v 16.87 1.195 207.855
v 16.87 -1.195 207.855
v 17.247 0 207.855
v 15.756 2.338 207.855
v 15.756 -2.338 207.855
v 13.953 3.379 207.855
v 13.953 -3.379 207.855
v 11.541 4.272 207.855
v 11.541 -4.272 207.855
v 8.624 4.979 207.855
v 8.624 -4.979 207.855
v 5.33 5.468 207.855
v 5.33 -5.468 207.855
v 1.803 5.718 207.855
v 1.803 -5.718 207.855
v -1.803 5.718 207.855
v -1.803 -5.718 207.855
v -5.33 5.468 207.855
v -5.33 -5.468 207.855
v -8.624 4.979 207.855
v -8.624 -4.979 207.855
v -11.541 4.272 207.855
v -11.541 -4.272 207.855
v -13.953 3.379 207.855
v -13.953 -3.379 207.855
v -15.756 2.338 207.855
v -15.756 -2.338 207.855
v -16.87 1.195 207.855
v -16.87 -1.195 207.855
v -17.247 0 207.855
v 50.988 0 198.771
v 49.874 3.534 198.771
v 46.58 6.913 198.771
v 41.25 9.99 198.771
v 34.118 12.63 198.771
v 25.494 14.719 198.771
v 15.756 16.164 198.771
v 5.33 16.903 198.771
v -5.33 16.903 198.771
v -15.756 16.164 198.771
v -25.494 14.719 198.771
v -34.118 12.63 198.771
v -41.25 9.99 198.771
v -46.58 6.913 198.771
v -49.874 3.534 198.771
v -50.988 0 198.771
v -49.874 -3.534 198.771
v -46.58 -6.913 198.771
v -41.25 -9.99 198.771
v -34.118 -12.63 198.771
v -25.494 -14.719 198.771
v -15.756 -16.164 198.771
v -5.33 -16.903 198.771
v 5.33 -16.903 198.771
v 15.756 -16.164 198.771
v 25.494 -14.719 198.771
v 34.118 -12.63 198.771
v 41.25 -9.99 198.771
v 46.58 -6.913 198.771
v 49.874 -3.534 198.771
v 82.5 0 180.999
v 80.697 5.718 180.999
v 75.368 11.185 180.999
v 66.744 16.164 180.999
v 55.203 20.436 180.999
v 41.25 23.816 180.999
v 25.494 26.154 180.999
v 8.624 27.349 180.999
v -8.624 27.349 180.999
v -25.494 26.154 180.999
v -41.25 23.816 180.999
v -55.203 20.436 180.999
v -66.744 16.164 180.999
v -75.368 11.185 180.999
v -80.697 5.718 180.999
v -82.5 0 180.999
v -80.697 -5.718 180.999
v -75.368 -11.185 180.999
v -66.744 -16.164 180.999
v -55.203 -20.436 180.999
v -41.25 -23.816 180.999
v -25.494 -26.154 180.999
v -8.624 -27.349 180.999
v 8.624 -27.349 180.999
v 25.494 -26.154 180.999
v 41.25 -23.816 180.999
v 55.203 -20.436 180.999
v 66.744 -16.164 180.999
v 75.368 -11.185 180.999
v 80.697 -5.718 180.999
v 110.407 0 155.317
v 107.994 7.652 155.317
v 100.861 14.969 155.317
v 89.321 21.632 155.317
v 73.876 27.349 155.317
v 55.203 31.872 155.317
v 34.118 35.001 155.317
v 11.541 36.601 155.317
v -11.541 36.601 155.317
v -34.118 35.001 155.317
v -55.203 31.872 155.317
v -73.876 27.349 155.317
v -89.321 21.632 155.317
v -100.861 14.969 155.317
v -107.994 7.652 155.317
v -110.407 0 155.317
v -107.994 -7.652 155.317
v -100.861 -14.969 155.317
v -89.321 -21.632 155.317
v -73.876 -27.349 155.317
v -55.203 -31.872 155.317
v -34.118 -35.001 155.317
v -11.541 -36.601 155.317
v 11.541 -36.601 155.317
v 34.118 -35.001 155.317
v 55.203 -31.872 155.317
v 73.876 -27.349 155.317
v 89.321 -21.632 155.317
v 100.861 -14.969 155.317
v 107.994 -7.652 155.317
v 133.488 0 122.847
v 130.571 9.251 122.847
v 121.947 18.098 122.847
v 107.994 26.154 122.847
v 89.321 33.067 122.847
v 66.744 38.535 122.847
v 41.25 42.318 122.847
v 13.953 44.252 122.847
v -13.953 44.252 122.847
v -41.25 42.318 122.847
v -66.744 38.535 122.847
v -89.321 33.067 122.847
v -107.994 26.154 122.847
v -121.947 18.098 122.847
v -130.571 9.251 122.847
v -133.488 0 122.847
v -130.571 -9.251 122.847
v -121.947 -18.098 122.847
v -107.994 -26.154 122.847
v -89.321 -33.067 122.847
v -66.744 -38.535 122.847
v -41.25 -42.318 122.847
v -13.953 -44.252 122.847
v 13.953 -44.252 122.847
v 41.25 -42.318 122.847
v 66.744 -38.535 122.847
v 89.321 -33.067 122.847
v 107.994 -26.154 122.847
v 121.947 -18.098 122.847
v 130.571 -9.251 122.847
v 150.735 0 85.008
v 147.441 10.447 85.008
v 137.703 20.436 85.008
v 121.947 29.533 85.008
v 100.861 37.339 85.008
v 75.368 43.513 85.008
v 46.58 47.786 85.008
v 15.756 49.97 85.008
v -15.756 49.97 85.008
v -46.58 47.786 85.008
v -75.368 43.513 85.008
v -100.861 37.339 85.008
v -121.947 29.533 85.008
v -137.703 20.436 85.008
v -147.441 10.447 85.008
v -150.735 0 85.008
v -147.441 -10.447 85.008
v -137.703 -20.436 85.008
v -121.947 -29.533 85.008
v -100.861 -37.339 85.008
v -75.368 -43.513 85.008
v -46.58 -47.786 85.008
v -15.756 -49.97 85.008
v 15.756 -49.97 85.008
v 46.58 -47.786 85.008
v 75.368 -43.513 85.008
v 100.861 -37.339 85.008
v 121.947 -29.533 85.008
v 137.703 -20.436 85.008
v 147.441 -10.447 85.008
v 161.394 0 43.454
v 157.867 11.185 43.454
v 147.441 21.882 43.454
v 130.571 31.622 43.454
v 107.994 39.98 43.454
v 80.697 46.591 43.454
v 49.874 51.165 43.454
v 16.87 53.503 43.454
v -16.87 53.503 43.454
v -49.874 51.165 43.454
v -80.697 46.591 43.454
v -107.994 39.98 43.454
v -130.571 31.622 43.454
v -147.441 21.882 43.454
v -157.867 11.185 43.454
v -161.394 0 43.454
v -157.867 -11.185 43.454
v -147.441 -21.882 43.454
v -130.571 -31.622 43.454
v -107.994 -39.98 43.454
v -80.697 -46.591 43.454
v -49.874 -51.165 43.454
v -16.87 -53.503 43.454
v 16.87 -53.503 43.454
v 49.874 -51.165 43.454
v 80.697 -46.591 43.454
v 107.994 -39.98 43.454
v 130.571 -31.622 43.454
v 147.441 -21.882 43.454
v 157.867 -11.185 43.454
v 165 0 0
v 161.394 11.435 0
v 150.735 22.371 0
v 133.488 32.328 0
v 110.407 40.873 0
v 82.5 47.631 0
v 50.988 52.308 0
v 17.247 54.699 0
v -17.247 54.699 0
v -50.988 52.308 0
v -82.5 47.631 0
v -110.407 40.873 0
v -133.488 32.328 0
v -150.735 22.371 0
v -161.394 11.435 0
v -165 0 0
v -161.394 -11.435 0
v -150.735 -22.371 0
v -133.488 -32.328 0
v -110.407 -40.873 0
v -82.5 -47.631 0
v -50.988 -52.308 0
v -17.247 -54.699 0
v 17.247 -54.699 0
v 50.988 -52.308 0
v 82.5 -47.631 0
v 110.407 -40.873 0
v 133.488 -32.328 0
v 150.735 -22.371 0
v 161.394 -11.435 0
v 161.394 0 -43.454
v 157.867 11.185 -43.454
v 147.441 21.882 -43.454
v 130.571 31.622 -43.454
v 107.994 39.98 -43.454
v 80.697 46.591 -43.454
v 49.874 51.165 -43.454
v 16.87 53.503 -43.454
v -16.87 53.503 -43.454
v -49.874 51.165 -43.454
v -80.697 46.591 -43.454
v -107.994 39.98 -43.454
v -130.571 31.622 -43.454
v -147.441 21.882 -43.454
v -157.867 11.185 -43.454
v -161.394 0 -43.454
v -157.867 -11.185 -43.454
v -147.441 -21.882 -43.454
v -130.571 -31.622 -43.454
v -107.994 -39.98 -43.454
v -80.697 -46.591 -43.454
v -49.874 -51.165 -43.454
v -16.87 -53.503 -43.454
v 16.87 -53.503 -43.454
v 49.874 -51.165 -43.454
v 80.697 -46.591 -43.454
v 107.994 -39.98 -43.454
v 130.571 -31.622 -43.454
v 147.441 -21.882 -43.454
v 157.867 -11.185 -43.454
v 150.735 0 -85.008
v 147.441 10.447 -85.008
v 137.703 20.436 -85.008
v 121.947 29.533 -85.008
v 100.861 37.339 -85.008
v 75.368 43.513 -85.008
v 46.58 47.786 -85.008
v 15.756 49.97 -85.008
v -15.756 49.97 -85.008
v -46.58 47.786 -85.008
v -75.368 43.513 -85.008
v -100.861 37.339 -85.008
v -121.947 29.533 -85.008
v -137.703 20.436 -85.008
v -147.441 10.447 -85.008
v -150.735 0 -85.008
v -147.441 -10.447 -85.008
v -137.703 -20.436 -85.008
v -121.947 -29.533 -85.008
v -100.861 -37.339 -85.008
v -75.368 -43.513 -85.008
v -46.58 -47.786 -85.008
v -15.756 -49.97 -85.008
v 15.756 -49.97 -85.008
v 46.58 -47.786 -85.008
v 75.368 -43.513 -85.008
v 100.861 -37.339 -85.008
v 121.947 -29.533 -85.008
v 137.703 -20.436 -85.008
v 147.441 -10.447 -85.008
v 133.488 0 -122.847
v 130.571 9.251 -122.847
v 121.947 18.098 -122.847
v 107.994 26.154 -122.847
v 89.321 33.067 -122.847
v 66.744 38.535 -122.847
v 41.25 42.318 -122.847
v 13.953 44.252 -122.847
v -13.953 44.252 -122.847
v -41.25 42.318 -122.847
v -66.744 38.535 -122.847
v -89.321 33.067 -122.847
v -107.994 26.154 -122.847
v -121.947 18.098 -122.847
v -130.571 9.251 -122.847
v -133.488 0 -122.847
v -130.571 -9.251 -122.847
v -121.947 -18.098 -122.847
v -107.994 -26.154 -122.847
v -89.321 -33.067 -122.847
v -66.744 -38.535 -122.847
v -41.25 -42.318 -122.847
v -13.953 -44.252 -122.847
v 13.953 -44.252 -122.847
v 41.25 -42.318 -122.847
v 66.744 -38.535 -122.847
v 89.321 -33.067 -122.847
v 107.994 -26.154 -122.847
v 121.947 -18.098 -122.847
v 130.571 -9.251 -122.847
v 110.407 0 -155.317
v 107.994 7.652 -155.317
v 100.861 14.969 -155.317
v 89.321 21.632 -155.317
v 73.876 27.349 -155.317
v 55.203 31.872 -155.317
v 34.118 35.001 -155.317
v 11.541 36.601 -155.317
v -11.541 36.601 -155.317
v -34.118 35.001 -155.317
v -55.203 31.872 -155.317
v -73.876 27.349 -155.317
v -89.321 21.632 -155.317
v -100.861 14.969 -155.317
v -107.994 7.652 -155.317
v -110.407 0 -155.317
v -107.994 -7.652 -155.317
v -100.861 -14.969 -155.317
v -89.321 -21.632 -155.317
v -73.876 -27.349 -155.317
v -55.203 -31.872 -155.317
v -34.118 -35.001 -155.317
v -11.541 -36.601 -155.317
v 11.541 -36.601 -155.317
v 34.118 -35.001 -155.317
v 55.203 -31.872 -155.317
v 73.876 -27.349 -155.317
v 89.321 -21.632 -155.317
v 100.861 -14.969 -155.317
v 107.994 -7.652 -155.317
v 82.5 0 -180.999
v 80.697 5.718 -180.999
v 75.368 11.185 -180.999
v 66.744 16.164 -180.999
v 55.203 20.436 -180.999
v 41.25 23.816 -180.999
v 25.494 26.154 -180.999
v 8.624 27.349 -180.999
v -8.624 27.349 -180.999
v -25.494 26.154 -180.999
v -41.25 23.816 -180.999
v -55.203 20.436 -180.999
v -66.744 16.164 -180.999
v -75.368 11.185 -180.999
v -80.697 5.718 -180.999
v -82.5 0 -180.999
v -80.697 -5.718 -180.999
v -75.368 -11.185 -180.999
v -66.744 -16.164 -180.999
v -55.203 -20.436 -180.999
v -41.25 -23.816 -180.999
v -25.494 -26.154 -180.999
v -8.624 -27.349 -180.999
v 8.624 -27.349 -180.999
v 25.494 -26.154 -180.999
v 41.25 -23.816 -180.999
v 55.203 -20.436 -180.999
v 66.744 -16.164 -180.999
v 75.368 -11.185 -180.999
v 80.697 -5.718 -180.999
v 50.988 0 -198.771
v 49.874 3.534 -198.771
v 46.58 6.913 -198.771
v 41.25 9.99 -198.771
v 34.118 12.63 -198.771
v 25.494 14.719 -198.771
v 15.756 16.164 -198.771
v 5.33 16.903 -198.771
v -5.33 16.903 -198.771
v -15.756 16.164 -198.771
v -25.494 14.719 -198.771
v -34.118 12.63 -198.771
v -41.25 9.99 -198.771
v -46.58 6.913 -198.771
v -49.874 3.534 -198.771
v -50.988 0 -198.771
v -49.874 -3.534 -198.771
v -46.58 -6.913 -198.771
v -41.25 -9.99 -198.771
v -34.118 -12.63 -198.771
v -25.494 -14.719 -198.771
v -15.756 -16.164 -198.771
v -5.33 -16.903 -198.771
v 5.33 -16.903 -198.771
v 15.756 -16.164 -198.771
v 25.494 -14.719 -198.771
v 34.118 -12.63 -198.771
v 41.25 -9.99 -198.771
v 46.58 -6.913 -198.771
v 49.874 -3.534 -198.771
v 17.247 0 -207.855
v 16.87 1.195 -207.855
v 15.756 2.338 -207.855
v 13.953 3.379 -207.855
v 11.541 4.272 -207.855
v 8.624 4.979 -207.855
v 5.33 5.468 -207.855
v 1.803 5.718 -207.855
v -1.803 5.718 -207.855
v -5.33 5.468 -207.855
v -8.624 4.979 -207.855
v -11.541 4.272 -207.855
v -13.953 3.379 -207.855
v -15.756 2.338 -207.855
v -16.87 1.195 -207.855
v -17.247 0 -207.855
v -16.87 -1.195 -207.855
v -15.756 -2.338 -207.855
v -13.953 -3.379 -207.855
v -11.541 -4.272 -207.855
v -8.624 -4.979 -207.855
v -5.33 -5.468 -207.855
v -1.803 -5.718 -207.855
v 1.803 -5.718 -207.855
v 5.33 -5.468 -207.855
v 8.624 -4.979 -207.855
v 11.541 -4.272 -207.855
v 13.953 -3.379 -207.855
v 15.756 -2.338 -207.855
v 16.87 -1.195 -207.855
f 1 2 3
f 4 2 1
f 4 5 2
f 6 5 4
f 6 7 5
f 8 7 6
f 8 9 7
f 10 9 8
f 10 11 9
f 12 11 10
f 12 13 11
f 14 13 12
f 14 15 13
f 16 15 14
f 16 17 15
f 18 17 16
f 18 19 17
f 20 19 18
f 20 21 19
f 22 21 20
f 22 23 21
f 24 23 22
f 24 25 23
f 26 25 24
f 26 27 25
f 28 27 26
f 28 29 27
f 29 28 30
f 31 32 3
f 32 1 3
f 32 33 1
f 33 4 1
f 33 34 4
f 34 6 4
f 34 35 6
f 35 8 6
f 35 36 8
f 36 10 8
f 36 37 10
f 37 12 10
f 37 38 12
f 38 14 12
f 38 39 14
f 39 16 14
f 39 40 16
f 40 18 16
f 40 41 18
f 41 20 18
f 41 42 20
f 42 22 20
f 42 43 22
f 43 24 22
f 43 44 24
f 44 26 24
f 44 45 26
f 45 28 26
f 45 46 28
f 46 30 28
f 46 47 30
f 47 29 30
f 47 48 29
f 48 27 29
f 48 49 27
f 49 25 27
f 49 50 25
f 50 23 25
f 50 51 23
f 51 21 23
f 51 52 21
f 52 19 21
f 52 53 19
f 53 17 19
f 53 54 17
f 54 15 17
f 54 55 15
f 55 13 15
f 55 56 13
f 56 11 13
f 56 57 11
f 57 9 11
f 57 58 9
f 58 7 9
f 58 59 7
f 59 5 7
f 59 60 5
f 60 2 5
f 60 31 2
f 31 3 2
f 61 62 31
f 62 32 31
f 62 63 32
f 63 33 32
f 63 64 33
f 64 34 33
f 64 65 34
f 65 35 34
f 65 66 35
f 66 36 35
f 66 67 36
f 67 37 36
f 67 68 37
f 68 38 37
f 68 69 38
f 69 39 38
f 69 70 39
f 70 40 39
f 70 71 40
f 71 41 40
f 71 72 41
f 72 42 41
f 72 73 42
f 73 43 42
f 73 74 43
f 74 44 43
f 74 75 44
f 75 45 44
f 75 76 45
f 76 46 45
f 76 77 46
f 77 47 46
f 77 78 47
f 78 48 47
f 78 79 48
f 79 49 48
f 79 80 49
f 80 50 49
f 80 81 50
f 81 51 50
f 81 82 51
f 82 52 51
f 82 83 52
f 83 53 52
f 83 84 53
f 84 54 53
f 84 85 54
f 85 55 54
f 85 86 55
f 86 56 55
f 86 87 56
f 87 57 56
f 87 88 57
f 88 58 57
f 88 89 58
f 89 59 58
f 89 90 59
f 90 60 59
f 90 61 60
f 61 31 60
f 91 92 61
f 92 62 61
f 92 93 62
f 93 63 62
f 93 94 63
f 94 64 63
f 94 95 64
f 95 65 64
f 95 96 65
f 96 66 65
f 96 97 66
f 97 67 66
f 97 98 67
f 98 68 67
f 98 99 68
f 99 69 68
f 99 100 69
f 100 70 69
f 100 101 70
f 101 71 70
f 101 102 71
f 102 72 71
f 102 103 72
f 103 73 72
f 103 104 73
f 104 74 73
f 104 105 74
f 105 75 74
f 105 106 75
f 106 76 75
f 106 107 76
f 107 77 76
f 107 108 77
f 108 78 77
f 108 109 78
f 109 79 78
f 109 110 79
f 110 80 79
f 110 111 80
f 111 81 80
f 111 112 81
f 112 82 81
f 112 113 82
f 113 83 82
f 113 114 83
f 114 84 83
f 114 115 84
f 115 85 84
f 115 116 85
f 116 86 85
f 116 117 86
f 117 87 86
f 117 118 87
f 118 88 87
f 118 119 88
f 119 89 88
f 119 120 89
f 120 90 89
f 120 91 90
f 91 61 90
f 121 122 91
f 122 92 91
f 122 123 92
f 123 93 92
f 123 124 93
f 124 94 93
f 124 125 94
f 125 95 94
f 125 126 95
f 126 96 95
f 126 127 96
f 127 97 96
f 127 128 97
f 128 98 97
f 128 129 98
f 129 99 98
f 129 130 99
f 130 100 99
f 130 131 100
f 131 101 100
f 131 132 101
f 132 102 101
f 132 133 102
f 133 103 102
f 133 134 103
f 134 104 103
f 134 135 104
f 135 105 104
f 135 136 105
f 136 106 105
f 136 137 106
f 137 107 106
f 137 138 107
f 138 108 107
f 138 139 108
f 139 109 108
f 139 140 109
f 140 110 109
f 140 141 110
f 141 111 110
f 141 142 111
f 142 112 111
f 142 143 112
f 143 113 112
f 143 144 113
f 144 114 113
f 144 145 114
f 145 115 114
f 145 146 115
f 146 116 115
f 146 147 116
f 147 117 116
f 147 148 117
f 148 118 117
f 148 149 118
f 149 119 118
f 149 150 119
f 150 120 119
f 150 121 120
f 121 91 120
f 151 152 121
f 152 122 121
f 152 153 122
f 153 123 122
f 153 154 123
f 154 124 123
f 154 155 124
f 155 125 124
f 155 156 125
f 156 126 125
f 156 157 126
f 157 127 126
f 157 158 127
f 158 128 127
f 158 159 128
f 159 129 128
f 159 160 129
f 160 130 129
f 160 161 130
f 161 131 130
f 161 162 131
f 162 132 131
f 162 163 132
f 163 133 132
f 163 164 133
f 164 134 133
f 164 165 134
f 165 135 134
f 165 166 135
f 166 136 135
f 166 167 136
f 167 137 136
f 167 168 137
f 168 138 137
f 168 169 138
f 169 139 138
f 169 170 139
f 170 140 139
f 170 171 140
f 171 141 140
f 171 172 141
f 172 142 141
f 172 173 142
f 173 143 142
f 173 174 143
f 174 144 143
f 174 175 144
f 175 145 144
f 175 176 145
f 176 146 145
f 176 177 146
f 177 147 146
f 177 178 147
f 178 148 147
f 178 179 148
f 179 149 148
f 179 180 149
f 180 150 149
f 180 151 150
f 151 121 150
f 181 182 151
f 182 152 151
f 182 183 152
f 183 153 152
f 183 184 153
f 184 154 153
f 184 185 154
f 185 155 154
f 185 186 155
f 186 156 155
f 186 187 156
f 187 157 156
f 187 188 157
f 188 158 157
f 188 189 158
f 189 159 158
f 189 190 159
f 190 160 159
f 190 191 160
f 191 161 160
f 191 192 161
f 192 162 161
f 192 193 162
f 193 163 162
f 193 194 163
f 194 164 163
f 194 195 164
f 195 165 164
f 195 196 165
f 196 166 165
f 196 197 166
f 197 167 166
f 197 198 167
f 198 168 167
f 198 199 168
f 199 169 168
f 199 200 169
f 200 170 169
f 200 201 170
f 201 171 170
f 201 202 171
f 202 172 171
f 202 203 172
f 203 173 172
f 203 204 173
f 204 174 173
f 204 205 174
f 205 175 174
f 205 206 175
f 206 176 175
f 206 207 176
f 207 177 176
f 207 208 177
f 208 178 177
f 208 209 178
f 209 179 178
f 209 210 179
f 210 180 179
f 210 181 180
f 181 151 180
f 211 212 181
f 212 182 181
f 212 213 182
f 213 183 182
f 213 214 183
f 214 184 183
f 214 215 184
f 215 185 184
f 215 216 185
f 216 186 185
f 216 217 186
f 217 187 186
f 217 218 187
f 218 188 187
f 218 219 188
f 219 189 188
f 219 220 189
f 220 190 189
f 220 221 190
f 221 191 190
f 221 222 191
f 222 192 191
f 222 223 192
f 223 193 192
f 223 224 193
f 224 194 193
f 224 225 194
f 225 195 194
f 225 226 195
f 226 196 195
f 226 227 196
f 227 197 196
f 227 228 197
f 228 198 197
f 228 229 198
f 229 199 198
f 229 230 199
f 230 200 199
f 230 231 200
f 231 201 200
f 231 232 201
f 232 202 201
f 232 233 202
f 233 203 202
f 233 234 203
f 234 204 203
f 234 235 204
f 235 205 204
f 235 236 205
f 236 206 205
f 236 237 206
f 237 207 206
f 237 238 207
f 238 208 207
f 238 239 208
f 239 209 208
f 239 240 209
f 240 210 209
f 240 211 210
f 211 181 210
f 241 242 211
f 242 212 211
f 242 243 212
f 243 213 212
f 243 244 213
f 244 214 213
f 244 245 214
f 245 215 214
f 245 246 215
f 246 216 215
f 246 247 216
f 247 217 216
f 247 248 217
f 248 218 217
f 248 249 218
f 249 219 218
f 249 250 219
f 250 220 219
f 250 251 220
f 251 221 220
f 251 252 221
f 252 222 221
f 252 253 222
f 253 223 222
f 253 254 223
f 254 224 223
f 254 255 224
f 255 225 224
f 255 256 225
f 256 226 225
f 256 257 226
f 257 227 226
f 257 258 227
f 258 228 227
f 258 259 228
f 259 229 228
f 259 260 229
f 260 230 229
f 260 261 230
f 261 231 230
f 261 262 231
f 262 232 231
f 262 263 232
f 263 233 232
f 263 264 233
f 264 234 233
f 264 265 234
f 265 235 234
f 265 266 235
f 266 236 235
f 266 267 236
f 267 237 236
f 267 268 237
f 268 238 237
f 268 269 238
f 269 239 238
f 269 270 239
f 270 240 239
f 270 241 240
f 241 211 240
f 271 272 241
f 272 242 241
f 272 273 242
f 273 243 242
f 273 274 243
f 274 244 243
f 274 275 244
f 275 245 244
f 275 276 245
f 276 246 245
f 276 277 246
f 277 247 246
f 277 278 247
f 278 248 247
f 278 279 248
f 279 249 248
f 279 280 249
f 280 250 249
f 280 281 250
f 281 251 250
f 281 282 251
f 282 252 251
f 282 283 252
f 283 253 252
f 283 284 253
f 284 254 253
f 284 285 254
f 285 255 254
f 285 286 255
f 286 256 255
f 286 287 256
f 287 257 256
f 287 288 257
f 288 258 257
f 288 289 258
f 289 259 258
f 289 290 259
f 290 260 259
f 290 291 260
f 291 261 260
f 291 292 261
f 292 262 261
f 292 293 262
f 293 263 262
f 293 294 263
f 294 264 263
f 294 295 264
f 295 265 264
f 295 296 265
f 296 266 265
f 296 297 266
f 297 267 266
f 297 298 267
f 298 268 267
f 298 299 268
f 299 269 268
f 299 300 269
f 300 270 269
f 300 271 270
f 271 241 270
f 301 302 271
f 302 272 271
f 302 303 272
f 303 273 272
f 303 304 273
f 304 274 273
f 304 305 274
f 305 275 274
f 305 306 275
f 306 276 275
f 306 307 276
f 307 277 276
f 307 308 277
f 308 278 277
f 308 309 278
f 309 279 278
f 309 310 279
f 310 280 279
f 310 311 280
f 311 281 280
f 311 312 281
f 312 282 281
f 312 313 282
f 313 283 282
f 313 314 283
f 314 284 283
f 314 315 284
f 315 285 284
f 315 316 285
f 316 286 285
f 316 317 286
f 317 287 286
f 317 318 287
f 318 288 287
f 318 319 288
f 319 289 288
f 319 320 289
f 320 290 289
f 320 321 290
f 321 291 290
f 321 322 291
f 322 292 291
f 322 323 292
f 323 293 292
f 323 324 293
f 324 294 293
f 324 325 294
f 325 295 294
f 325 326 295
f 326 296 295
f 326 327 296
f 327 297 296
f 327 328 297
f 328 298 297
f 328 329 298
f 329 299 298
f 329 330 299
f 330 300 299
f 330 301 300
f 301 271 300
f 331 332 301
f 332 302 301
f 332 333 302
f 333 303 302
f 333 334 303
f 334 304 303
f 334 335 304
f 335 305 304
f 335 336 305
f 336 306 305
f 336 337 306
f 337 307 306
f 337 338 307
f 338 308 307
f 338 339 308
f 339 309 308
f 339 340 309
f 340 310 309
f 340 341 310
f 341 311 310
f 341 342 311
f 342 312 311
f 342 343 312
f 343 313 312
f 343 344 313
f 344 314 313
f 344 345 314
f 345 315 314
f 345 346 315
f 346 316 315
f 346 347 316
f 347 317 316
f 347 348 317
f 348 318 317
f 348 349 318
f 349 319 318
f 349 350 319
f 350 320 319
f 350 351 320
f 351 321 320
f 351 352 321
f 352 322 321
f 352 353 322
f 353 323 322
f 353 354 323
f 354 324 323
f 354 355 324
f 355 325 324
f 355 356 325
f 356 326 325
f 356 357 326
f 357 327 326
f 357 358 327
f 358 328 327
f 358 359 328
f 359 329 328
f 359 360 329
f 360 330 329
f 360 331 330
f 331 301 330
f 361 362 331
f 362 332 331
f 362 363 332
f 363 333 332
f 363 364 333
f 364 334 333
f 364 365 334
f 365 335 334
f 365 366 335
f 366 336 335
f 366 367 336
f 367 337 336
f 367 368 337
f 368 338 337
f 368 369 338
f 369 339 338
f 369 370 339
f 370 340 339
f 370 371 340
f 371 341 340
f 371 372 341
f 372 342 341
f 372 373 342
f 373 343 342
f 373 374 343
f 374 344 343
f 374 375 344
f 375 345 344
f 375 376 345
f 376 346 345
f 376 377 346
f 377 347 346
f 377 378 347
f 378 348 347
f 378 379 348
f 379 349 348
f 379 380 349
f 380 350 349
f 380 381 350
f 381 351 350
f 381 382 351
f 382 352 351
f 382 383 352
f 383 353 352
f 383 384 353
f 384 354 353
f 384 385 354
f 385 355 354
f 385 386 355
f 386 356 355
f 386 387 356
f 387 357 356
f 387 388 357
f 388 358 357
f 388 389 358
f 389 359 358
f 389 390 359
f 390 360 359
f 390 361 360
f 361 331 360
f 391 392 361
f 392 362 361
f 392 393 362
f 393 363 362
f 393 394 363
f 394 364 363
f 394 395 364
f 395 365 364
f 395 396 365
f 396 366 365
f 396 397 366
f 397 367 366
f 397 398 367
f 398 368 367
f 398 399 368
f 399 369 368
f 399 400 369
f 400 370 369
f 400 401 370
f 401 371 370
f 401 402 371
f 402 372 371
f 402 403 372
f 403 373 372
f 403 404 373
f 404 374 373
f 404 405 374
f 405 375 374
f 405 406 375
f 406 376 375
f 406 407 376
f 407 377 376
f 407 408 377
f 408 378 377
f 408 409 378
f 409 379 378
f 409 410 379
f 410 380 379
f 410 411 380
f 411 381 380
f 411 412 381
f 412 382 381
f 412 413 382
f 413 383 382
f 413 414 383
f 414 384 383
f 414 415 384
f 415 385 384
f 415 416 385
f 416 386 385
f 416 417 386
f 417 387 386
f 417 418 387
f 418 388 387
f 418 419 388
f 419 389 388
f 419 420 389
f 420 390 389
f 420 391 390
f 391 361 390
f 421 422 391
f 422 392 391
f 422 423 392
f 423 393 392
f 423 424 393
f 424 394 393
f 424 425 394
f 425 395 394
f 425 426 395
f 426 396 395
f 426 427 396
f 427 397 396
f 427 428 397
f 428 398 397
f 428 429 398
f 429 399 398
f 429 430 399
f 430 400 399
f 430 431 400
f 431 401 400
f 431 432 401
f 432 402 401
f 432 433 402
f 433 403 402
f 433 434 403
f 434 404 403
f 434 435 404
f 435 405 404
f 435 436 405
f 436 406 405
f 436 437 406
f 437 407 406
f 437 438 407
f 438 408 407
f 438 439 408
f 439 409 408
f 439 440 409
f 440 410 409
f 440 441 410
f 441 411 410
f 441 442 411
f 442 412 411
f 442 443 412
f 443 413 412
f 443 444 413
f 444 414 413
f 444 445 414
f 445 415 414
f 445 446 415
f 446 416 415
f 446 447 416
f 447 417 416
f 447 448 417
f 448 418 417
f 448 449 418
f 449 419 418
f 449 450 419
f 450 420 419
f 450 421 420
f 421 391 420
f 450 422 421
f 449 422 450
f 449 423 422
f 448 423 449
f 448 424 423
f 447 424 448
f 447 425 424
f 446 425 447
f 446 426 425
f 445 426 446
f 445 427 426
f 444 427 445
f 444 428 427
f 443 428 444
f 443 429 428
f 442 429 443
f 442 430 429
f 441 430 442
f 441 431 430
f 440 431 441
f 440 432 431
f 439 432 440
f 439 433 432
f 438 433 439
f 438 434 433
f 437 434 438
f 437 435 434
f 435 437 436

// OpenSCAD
// Generated by SolidPython 1.0.1 on 2020-07-29 00:46:51


scale(v = [15, 5, 19]) {
	sphere(r = 11);
}
/***********************************************
*********      SolidPython code:      **********
************************************************
 
# import packages: SolidPython
from solid import *
from solid.utils import *
from itertools import chain, combinations, permutations


class Resize:

    def __init__(self, scad_file):
        self.scad_file = scad_file
        #self.scad_file = import_scad(scad_file)
        # cone/cylinder param:
        self.r1 = 0
        self.r2 = 0
        self.h = 0
        # rectangular prism param:
        self.w = 0
        self.l = 0
        # ellipse param:
        self.r = 0

    # import OpenScad code (file name corresponds to shape)


    # classify shape + parameters
    def assign(self, param1, param2, param3):
        if self.scad_file == 'cone.scad':
            self.r1 = param1
            self.r2 = param2
            self.h = param3
        elif self.scad_file == 'cylinder.scad':
            self.r1 = param1
            self.r2 = param2
            self.h = param3
        elif self.scad_file == 'rectangularPrism.scad':
            self.h = param1
            self.l = param2
            self.w = param3
        else:
            self.r = param1
            self.h = param2

    # resize parameters
    def iterate(self):
        x = range(3, 20, 2)
        i = 1
        if self.scad_file == 'cone.scad':
            tempList = list(permutations(x, 2))
            for temp in tempList:
                param1 = temp[0]
                param2 = temp[1]
                filepath = 'produced_scad_files/' + 'cone' + str(param1) + '_' + str(param2) + '_' + '.scad'
                scad_render_to_file(cylinder(h=param1, r1=param2, r2=0), filepath)

        elif self.scad_file == 'cylinder.scad':
            tempList = list(permutations(x, 3))
            for temp in tempList:
                param1 = temp[0]
                param2 = temp[1]
                filepath = 'produced_scad_files/' + 'cylinder' + str(param1) + '_' + str(param2) + '_' + '.scad'
                scad_render_to_file(cylinder(h=param1, r1=param2, r2=param2), filepath)

        elif self.scad_file == 'rectangularPrism.scad':
            tempList = list(permutations(x, 3))
            for temp in tempList:
                param1 = temp[0]
                param2 = temp[1]
                param3 = temp[2]
                filepath = 'produced_scad_files/' + 'rectangularPrism' + str(param1) + '_' + str(param2) + '_' + str(
                    param3) + '.scad'
                scad_render_to_file(cube(size=(param1, param2, param3)), filepath)

        elif self.scad_file == 'ellipse.scad':
            tempList = list(permutations(x, 4))
            for temp in tempList:
                param1 = temp[0]
                param2 = temp[1]
                param3 = temp[2]
                param4 = temp[3]
                filepath = 'produced_scad_files/' + 'ellipse' + str(param1) + '_' + str(param2) + '_' + str(param3) + '_' + str(param4) + '.scad'
                scad_render_to_file(scale([param1, param2, param3])(sphere(r=param4)), filepath)

    def render_to_scadfile(self):
        scad_render_to_file(scad, 'example.scad') 
 
************************************************/
